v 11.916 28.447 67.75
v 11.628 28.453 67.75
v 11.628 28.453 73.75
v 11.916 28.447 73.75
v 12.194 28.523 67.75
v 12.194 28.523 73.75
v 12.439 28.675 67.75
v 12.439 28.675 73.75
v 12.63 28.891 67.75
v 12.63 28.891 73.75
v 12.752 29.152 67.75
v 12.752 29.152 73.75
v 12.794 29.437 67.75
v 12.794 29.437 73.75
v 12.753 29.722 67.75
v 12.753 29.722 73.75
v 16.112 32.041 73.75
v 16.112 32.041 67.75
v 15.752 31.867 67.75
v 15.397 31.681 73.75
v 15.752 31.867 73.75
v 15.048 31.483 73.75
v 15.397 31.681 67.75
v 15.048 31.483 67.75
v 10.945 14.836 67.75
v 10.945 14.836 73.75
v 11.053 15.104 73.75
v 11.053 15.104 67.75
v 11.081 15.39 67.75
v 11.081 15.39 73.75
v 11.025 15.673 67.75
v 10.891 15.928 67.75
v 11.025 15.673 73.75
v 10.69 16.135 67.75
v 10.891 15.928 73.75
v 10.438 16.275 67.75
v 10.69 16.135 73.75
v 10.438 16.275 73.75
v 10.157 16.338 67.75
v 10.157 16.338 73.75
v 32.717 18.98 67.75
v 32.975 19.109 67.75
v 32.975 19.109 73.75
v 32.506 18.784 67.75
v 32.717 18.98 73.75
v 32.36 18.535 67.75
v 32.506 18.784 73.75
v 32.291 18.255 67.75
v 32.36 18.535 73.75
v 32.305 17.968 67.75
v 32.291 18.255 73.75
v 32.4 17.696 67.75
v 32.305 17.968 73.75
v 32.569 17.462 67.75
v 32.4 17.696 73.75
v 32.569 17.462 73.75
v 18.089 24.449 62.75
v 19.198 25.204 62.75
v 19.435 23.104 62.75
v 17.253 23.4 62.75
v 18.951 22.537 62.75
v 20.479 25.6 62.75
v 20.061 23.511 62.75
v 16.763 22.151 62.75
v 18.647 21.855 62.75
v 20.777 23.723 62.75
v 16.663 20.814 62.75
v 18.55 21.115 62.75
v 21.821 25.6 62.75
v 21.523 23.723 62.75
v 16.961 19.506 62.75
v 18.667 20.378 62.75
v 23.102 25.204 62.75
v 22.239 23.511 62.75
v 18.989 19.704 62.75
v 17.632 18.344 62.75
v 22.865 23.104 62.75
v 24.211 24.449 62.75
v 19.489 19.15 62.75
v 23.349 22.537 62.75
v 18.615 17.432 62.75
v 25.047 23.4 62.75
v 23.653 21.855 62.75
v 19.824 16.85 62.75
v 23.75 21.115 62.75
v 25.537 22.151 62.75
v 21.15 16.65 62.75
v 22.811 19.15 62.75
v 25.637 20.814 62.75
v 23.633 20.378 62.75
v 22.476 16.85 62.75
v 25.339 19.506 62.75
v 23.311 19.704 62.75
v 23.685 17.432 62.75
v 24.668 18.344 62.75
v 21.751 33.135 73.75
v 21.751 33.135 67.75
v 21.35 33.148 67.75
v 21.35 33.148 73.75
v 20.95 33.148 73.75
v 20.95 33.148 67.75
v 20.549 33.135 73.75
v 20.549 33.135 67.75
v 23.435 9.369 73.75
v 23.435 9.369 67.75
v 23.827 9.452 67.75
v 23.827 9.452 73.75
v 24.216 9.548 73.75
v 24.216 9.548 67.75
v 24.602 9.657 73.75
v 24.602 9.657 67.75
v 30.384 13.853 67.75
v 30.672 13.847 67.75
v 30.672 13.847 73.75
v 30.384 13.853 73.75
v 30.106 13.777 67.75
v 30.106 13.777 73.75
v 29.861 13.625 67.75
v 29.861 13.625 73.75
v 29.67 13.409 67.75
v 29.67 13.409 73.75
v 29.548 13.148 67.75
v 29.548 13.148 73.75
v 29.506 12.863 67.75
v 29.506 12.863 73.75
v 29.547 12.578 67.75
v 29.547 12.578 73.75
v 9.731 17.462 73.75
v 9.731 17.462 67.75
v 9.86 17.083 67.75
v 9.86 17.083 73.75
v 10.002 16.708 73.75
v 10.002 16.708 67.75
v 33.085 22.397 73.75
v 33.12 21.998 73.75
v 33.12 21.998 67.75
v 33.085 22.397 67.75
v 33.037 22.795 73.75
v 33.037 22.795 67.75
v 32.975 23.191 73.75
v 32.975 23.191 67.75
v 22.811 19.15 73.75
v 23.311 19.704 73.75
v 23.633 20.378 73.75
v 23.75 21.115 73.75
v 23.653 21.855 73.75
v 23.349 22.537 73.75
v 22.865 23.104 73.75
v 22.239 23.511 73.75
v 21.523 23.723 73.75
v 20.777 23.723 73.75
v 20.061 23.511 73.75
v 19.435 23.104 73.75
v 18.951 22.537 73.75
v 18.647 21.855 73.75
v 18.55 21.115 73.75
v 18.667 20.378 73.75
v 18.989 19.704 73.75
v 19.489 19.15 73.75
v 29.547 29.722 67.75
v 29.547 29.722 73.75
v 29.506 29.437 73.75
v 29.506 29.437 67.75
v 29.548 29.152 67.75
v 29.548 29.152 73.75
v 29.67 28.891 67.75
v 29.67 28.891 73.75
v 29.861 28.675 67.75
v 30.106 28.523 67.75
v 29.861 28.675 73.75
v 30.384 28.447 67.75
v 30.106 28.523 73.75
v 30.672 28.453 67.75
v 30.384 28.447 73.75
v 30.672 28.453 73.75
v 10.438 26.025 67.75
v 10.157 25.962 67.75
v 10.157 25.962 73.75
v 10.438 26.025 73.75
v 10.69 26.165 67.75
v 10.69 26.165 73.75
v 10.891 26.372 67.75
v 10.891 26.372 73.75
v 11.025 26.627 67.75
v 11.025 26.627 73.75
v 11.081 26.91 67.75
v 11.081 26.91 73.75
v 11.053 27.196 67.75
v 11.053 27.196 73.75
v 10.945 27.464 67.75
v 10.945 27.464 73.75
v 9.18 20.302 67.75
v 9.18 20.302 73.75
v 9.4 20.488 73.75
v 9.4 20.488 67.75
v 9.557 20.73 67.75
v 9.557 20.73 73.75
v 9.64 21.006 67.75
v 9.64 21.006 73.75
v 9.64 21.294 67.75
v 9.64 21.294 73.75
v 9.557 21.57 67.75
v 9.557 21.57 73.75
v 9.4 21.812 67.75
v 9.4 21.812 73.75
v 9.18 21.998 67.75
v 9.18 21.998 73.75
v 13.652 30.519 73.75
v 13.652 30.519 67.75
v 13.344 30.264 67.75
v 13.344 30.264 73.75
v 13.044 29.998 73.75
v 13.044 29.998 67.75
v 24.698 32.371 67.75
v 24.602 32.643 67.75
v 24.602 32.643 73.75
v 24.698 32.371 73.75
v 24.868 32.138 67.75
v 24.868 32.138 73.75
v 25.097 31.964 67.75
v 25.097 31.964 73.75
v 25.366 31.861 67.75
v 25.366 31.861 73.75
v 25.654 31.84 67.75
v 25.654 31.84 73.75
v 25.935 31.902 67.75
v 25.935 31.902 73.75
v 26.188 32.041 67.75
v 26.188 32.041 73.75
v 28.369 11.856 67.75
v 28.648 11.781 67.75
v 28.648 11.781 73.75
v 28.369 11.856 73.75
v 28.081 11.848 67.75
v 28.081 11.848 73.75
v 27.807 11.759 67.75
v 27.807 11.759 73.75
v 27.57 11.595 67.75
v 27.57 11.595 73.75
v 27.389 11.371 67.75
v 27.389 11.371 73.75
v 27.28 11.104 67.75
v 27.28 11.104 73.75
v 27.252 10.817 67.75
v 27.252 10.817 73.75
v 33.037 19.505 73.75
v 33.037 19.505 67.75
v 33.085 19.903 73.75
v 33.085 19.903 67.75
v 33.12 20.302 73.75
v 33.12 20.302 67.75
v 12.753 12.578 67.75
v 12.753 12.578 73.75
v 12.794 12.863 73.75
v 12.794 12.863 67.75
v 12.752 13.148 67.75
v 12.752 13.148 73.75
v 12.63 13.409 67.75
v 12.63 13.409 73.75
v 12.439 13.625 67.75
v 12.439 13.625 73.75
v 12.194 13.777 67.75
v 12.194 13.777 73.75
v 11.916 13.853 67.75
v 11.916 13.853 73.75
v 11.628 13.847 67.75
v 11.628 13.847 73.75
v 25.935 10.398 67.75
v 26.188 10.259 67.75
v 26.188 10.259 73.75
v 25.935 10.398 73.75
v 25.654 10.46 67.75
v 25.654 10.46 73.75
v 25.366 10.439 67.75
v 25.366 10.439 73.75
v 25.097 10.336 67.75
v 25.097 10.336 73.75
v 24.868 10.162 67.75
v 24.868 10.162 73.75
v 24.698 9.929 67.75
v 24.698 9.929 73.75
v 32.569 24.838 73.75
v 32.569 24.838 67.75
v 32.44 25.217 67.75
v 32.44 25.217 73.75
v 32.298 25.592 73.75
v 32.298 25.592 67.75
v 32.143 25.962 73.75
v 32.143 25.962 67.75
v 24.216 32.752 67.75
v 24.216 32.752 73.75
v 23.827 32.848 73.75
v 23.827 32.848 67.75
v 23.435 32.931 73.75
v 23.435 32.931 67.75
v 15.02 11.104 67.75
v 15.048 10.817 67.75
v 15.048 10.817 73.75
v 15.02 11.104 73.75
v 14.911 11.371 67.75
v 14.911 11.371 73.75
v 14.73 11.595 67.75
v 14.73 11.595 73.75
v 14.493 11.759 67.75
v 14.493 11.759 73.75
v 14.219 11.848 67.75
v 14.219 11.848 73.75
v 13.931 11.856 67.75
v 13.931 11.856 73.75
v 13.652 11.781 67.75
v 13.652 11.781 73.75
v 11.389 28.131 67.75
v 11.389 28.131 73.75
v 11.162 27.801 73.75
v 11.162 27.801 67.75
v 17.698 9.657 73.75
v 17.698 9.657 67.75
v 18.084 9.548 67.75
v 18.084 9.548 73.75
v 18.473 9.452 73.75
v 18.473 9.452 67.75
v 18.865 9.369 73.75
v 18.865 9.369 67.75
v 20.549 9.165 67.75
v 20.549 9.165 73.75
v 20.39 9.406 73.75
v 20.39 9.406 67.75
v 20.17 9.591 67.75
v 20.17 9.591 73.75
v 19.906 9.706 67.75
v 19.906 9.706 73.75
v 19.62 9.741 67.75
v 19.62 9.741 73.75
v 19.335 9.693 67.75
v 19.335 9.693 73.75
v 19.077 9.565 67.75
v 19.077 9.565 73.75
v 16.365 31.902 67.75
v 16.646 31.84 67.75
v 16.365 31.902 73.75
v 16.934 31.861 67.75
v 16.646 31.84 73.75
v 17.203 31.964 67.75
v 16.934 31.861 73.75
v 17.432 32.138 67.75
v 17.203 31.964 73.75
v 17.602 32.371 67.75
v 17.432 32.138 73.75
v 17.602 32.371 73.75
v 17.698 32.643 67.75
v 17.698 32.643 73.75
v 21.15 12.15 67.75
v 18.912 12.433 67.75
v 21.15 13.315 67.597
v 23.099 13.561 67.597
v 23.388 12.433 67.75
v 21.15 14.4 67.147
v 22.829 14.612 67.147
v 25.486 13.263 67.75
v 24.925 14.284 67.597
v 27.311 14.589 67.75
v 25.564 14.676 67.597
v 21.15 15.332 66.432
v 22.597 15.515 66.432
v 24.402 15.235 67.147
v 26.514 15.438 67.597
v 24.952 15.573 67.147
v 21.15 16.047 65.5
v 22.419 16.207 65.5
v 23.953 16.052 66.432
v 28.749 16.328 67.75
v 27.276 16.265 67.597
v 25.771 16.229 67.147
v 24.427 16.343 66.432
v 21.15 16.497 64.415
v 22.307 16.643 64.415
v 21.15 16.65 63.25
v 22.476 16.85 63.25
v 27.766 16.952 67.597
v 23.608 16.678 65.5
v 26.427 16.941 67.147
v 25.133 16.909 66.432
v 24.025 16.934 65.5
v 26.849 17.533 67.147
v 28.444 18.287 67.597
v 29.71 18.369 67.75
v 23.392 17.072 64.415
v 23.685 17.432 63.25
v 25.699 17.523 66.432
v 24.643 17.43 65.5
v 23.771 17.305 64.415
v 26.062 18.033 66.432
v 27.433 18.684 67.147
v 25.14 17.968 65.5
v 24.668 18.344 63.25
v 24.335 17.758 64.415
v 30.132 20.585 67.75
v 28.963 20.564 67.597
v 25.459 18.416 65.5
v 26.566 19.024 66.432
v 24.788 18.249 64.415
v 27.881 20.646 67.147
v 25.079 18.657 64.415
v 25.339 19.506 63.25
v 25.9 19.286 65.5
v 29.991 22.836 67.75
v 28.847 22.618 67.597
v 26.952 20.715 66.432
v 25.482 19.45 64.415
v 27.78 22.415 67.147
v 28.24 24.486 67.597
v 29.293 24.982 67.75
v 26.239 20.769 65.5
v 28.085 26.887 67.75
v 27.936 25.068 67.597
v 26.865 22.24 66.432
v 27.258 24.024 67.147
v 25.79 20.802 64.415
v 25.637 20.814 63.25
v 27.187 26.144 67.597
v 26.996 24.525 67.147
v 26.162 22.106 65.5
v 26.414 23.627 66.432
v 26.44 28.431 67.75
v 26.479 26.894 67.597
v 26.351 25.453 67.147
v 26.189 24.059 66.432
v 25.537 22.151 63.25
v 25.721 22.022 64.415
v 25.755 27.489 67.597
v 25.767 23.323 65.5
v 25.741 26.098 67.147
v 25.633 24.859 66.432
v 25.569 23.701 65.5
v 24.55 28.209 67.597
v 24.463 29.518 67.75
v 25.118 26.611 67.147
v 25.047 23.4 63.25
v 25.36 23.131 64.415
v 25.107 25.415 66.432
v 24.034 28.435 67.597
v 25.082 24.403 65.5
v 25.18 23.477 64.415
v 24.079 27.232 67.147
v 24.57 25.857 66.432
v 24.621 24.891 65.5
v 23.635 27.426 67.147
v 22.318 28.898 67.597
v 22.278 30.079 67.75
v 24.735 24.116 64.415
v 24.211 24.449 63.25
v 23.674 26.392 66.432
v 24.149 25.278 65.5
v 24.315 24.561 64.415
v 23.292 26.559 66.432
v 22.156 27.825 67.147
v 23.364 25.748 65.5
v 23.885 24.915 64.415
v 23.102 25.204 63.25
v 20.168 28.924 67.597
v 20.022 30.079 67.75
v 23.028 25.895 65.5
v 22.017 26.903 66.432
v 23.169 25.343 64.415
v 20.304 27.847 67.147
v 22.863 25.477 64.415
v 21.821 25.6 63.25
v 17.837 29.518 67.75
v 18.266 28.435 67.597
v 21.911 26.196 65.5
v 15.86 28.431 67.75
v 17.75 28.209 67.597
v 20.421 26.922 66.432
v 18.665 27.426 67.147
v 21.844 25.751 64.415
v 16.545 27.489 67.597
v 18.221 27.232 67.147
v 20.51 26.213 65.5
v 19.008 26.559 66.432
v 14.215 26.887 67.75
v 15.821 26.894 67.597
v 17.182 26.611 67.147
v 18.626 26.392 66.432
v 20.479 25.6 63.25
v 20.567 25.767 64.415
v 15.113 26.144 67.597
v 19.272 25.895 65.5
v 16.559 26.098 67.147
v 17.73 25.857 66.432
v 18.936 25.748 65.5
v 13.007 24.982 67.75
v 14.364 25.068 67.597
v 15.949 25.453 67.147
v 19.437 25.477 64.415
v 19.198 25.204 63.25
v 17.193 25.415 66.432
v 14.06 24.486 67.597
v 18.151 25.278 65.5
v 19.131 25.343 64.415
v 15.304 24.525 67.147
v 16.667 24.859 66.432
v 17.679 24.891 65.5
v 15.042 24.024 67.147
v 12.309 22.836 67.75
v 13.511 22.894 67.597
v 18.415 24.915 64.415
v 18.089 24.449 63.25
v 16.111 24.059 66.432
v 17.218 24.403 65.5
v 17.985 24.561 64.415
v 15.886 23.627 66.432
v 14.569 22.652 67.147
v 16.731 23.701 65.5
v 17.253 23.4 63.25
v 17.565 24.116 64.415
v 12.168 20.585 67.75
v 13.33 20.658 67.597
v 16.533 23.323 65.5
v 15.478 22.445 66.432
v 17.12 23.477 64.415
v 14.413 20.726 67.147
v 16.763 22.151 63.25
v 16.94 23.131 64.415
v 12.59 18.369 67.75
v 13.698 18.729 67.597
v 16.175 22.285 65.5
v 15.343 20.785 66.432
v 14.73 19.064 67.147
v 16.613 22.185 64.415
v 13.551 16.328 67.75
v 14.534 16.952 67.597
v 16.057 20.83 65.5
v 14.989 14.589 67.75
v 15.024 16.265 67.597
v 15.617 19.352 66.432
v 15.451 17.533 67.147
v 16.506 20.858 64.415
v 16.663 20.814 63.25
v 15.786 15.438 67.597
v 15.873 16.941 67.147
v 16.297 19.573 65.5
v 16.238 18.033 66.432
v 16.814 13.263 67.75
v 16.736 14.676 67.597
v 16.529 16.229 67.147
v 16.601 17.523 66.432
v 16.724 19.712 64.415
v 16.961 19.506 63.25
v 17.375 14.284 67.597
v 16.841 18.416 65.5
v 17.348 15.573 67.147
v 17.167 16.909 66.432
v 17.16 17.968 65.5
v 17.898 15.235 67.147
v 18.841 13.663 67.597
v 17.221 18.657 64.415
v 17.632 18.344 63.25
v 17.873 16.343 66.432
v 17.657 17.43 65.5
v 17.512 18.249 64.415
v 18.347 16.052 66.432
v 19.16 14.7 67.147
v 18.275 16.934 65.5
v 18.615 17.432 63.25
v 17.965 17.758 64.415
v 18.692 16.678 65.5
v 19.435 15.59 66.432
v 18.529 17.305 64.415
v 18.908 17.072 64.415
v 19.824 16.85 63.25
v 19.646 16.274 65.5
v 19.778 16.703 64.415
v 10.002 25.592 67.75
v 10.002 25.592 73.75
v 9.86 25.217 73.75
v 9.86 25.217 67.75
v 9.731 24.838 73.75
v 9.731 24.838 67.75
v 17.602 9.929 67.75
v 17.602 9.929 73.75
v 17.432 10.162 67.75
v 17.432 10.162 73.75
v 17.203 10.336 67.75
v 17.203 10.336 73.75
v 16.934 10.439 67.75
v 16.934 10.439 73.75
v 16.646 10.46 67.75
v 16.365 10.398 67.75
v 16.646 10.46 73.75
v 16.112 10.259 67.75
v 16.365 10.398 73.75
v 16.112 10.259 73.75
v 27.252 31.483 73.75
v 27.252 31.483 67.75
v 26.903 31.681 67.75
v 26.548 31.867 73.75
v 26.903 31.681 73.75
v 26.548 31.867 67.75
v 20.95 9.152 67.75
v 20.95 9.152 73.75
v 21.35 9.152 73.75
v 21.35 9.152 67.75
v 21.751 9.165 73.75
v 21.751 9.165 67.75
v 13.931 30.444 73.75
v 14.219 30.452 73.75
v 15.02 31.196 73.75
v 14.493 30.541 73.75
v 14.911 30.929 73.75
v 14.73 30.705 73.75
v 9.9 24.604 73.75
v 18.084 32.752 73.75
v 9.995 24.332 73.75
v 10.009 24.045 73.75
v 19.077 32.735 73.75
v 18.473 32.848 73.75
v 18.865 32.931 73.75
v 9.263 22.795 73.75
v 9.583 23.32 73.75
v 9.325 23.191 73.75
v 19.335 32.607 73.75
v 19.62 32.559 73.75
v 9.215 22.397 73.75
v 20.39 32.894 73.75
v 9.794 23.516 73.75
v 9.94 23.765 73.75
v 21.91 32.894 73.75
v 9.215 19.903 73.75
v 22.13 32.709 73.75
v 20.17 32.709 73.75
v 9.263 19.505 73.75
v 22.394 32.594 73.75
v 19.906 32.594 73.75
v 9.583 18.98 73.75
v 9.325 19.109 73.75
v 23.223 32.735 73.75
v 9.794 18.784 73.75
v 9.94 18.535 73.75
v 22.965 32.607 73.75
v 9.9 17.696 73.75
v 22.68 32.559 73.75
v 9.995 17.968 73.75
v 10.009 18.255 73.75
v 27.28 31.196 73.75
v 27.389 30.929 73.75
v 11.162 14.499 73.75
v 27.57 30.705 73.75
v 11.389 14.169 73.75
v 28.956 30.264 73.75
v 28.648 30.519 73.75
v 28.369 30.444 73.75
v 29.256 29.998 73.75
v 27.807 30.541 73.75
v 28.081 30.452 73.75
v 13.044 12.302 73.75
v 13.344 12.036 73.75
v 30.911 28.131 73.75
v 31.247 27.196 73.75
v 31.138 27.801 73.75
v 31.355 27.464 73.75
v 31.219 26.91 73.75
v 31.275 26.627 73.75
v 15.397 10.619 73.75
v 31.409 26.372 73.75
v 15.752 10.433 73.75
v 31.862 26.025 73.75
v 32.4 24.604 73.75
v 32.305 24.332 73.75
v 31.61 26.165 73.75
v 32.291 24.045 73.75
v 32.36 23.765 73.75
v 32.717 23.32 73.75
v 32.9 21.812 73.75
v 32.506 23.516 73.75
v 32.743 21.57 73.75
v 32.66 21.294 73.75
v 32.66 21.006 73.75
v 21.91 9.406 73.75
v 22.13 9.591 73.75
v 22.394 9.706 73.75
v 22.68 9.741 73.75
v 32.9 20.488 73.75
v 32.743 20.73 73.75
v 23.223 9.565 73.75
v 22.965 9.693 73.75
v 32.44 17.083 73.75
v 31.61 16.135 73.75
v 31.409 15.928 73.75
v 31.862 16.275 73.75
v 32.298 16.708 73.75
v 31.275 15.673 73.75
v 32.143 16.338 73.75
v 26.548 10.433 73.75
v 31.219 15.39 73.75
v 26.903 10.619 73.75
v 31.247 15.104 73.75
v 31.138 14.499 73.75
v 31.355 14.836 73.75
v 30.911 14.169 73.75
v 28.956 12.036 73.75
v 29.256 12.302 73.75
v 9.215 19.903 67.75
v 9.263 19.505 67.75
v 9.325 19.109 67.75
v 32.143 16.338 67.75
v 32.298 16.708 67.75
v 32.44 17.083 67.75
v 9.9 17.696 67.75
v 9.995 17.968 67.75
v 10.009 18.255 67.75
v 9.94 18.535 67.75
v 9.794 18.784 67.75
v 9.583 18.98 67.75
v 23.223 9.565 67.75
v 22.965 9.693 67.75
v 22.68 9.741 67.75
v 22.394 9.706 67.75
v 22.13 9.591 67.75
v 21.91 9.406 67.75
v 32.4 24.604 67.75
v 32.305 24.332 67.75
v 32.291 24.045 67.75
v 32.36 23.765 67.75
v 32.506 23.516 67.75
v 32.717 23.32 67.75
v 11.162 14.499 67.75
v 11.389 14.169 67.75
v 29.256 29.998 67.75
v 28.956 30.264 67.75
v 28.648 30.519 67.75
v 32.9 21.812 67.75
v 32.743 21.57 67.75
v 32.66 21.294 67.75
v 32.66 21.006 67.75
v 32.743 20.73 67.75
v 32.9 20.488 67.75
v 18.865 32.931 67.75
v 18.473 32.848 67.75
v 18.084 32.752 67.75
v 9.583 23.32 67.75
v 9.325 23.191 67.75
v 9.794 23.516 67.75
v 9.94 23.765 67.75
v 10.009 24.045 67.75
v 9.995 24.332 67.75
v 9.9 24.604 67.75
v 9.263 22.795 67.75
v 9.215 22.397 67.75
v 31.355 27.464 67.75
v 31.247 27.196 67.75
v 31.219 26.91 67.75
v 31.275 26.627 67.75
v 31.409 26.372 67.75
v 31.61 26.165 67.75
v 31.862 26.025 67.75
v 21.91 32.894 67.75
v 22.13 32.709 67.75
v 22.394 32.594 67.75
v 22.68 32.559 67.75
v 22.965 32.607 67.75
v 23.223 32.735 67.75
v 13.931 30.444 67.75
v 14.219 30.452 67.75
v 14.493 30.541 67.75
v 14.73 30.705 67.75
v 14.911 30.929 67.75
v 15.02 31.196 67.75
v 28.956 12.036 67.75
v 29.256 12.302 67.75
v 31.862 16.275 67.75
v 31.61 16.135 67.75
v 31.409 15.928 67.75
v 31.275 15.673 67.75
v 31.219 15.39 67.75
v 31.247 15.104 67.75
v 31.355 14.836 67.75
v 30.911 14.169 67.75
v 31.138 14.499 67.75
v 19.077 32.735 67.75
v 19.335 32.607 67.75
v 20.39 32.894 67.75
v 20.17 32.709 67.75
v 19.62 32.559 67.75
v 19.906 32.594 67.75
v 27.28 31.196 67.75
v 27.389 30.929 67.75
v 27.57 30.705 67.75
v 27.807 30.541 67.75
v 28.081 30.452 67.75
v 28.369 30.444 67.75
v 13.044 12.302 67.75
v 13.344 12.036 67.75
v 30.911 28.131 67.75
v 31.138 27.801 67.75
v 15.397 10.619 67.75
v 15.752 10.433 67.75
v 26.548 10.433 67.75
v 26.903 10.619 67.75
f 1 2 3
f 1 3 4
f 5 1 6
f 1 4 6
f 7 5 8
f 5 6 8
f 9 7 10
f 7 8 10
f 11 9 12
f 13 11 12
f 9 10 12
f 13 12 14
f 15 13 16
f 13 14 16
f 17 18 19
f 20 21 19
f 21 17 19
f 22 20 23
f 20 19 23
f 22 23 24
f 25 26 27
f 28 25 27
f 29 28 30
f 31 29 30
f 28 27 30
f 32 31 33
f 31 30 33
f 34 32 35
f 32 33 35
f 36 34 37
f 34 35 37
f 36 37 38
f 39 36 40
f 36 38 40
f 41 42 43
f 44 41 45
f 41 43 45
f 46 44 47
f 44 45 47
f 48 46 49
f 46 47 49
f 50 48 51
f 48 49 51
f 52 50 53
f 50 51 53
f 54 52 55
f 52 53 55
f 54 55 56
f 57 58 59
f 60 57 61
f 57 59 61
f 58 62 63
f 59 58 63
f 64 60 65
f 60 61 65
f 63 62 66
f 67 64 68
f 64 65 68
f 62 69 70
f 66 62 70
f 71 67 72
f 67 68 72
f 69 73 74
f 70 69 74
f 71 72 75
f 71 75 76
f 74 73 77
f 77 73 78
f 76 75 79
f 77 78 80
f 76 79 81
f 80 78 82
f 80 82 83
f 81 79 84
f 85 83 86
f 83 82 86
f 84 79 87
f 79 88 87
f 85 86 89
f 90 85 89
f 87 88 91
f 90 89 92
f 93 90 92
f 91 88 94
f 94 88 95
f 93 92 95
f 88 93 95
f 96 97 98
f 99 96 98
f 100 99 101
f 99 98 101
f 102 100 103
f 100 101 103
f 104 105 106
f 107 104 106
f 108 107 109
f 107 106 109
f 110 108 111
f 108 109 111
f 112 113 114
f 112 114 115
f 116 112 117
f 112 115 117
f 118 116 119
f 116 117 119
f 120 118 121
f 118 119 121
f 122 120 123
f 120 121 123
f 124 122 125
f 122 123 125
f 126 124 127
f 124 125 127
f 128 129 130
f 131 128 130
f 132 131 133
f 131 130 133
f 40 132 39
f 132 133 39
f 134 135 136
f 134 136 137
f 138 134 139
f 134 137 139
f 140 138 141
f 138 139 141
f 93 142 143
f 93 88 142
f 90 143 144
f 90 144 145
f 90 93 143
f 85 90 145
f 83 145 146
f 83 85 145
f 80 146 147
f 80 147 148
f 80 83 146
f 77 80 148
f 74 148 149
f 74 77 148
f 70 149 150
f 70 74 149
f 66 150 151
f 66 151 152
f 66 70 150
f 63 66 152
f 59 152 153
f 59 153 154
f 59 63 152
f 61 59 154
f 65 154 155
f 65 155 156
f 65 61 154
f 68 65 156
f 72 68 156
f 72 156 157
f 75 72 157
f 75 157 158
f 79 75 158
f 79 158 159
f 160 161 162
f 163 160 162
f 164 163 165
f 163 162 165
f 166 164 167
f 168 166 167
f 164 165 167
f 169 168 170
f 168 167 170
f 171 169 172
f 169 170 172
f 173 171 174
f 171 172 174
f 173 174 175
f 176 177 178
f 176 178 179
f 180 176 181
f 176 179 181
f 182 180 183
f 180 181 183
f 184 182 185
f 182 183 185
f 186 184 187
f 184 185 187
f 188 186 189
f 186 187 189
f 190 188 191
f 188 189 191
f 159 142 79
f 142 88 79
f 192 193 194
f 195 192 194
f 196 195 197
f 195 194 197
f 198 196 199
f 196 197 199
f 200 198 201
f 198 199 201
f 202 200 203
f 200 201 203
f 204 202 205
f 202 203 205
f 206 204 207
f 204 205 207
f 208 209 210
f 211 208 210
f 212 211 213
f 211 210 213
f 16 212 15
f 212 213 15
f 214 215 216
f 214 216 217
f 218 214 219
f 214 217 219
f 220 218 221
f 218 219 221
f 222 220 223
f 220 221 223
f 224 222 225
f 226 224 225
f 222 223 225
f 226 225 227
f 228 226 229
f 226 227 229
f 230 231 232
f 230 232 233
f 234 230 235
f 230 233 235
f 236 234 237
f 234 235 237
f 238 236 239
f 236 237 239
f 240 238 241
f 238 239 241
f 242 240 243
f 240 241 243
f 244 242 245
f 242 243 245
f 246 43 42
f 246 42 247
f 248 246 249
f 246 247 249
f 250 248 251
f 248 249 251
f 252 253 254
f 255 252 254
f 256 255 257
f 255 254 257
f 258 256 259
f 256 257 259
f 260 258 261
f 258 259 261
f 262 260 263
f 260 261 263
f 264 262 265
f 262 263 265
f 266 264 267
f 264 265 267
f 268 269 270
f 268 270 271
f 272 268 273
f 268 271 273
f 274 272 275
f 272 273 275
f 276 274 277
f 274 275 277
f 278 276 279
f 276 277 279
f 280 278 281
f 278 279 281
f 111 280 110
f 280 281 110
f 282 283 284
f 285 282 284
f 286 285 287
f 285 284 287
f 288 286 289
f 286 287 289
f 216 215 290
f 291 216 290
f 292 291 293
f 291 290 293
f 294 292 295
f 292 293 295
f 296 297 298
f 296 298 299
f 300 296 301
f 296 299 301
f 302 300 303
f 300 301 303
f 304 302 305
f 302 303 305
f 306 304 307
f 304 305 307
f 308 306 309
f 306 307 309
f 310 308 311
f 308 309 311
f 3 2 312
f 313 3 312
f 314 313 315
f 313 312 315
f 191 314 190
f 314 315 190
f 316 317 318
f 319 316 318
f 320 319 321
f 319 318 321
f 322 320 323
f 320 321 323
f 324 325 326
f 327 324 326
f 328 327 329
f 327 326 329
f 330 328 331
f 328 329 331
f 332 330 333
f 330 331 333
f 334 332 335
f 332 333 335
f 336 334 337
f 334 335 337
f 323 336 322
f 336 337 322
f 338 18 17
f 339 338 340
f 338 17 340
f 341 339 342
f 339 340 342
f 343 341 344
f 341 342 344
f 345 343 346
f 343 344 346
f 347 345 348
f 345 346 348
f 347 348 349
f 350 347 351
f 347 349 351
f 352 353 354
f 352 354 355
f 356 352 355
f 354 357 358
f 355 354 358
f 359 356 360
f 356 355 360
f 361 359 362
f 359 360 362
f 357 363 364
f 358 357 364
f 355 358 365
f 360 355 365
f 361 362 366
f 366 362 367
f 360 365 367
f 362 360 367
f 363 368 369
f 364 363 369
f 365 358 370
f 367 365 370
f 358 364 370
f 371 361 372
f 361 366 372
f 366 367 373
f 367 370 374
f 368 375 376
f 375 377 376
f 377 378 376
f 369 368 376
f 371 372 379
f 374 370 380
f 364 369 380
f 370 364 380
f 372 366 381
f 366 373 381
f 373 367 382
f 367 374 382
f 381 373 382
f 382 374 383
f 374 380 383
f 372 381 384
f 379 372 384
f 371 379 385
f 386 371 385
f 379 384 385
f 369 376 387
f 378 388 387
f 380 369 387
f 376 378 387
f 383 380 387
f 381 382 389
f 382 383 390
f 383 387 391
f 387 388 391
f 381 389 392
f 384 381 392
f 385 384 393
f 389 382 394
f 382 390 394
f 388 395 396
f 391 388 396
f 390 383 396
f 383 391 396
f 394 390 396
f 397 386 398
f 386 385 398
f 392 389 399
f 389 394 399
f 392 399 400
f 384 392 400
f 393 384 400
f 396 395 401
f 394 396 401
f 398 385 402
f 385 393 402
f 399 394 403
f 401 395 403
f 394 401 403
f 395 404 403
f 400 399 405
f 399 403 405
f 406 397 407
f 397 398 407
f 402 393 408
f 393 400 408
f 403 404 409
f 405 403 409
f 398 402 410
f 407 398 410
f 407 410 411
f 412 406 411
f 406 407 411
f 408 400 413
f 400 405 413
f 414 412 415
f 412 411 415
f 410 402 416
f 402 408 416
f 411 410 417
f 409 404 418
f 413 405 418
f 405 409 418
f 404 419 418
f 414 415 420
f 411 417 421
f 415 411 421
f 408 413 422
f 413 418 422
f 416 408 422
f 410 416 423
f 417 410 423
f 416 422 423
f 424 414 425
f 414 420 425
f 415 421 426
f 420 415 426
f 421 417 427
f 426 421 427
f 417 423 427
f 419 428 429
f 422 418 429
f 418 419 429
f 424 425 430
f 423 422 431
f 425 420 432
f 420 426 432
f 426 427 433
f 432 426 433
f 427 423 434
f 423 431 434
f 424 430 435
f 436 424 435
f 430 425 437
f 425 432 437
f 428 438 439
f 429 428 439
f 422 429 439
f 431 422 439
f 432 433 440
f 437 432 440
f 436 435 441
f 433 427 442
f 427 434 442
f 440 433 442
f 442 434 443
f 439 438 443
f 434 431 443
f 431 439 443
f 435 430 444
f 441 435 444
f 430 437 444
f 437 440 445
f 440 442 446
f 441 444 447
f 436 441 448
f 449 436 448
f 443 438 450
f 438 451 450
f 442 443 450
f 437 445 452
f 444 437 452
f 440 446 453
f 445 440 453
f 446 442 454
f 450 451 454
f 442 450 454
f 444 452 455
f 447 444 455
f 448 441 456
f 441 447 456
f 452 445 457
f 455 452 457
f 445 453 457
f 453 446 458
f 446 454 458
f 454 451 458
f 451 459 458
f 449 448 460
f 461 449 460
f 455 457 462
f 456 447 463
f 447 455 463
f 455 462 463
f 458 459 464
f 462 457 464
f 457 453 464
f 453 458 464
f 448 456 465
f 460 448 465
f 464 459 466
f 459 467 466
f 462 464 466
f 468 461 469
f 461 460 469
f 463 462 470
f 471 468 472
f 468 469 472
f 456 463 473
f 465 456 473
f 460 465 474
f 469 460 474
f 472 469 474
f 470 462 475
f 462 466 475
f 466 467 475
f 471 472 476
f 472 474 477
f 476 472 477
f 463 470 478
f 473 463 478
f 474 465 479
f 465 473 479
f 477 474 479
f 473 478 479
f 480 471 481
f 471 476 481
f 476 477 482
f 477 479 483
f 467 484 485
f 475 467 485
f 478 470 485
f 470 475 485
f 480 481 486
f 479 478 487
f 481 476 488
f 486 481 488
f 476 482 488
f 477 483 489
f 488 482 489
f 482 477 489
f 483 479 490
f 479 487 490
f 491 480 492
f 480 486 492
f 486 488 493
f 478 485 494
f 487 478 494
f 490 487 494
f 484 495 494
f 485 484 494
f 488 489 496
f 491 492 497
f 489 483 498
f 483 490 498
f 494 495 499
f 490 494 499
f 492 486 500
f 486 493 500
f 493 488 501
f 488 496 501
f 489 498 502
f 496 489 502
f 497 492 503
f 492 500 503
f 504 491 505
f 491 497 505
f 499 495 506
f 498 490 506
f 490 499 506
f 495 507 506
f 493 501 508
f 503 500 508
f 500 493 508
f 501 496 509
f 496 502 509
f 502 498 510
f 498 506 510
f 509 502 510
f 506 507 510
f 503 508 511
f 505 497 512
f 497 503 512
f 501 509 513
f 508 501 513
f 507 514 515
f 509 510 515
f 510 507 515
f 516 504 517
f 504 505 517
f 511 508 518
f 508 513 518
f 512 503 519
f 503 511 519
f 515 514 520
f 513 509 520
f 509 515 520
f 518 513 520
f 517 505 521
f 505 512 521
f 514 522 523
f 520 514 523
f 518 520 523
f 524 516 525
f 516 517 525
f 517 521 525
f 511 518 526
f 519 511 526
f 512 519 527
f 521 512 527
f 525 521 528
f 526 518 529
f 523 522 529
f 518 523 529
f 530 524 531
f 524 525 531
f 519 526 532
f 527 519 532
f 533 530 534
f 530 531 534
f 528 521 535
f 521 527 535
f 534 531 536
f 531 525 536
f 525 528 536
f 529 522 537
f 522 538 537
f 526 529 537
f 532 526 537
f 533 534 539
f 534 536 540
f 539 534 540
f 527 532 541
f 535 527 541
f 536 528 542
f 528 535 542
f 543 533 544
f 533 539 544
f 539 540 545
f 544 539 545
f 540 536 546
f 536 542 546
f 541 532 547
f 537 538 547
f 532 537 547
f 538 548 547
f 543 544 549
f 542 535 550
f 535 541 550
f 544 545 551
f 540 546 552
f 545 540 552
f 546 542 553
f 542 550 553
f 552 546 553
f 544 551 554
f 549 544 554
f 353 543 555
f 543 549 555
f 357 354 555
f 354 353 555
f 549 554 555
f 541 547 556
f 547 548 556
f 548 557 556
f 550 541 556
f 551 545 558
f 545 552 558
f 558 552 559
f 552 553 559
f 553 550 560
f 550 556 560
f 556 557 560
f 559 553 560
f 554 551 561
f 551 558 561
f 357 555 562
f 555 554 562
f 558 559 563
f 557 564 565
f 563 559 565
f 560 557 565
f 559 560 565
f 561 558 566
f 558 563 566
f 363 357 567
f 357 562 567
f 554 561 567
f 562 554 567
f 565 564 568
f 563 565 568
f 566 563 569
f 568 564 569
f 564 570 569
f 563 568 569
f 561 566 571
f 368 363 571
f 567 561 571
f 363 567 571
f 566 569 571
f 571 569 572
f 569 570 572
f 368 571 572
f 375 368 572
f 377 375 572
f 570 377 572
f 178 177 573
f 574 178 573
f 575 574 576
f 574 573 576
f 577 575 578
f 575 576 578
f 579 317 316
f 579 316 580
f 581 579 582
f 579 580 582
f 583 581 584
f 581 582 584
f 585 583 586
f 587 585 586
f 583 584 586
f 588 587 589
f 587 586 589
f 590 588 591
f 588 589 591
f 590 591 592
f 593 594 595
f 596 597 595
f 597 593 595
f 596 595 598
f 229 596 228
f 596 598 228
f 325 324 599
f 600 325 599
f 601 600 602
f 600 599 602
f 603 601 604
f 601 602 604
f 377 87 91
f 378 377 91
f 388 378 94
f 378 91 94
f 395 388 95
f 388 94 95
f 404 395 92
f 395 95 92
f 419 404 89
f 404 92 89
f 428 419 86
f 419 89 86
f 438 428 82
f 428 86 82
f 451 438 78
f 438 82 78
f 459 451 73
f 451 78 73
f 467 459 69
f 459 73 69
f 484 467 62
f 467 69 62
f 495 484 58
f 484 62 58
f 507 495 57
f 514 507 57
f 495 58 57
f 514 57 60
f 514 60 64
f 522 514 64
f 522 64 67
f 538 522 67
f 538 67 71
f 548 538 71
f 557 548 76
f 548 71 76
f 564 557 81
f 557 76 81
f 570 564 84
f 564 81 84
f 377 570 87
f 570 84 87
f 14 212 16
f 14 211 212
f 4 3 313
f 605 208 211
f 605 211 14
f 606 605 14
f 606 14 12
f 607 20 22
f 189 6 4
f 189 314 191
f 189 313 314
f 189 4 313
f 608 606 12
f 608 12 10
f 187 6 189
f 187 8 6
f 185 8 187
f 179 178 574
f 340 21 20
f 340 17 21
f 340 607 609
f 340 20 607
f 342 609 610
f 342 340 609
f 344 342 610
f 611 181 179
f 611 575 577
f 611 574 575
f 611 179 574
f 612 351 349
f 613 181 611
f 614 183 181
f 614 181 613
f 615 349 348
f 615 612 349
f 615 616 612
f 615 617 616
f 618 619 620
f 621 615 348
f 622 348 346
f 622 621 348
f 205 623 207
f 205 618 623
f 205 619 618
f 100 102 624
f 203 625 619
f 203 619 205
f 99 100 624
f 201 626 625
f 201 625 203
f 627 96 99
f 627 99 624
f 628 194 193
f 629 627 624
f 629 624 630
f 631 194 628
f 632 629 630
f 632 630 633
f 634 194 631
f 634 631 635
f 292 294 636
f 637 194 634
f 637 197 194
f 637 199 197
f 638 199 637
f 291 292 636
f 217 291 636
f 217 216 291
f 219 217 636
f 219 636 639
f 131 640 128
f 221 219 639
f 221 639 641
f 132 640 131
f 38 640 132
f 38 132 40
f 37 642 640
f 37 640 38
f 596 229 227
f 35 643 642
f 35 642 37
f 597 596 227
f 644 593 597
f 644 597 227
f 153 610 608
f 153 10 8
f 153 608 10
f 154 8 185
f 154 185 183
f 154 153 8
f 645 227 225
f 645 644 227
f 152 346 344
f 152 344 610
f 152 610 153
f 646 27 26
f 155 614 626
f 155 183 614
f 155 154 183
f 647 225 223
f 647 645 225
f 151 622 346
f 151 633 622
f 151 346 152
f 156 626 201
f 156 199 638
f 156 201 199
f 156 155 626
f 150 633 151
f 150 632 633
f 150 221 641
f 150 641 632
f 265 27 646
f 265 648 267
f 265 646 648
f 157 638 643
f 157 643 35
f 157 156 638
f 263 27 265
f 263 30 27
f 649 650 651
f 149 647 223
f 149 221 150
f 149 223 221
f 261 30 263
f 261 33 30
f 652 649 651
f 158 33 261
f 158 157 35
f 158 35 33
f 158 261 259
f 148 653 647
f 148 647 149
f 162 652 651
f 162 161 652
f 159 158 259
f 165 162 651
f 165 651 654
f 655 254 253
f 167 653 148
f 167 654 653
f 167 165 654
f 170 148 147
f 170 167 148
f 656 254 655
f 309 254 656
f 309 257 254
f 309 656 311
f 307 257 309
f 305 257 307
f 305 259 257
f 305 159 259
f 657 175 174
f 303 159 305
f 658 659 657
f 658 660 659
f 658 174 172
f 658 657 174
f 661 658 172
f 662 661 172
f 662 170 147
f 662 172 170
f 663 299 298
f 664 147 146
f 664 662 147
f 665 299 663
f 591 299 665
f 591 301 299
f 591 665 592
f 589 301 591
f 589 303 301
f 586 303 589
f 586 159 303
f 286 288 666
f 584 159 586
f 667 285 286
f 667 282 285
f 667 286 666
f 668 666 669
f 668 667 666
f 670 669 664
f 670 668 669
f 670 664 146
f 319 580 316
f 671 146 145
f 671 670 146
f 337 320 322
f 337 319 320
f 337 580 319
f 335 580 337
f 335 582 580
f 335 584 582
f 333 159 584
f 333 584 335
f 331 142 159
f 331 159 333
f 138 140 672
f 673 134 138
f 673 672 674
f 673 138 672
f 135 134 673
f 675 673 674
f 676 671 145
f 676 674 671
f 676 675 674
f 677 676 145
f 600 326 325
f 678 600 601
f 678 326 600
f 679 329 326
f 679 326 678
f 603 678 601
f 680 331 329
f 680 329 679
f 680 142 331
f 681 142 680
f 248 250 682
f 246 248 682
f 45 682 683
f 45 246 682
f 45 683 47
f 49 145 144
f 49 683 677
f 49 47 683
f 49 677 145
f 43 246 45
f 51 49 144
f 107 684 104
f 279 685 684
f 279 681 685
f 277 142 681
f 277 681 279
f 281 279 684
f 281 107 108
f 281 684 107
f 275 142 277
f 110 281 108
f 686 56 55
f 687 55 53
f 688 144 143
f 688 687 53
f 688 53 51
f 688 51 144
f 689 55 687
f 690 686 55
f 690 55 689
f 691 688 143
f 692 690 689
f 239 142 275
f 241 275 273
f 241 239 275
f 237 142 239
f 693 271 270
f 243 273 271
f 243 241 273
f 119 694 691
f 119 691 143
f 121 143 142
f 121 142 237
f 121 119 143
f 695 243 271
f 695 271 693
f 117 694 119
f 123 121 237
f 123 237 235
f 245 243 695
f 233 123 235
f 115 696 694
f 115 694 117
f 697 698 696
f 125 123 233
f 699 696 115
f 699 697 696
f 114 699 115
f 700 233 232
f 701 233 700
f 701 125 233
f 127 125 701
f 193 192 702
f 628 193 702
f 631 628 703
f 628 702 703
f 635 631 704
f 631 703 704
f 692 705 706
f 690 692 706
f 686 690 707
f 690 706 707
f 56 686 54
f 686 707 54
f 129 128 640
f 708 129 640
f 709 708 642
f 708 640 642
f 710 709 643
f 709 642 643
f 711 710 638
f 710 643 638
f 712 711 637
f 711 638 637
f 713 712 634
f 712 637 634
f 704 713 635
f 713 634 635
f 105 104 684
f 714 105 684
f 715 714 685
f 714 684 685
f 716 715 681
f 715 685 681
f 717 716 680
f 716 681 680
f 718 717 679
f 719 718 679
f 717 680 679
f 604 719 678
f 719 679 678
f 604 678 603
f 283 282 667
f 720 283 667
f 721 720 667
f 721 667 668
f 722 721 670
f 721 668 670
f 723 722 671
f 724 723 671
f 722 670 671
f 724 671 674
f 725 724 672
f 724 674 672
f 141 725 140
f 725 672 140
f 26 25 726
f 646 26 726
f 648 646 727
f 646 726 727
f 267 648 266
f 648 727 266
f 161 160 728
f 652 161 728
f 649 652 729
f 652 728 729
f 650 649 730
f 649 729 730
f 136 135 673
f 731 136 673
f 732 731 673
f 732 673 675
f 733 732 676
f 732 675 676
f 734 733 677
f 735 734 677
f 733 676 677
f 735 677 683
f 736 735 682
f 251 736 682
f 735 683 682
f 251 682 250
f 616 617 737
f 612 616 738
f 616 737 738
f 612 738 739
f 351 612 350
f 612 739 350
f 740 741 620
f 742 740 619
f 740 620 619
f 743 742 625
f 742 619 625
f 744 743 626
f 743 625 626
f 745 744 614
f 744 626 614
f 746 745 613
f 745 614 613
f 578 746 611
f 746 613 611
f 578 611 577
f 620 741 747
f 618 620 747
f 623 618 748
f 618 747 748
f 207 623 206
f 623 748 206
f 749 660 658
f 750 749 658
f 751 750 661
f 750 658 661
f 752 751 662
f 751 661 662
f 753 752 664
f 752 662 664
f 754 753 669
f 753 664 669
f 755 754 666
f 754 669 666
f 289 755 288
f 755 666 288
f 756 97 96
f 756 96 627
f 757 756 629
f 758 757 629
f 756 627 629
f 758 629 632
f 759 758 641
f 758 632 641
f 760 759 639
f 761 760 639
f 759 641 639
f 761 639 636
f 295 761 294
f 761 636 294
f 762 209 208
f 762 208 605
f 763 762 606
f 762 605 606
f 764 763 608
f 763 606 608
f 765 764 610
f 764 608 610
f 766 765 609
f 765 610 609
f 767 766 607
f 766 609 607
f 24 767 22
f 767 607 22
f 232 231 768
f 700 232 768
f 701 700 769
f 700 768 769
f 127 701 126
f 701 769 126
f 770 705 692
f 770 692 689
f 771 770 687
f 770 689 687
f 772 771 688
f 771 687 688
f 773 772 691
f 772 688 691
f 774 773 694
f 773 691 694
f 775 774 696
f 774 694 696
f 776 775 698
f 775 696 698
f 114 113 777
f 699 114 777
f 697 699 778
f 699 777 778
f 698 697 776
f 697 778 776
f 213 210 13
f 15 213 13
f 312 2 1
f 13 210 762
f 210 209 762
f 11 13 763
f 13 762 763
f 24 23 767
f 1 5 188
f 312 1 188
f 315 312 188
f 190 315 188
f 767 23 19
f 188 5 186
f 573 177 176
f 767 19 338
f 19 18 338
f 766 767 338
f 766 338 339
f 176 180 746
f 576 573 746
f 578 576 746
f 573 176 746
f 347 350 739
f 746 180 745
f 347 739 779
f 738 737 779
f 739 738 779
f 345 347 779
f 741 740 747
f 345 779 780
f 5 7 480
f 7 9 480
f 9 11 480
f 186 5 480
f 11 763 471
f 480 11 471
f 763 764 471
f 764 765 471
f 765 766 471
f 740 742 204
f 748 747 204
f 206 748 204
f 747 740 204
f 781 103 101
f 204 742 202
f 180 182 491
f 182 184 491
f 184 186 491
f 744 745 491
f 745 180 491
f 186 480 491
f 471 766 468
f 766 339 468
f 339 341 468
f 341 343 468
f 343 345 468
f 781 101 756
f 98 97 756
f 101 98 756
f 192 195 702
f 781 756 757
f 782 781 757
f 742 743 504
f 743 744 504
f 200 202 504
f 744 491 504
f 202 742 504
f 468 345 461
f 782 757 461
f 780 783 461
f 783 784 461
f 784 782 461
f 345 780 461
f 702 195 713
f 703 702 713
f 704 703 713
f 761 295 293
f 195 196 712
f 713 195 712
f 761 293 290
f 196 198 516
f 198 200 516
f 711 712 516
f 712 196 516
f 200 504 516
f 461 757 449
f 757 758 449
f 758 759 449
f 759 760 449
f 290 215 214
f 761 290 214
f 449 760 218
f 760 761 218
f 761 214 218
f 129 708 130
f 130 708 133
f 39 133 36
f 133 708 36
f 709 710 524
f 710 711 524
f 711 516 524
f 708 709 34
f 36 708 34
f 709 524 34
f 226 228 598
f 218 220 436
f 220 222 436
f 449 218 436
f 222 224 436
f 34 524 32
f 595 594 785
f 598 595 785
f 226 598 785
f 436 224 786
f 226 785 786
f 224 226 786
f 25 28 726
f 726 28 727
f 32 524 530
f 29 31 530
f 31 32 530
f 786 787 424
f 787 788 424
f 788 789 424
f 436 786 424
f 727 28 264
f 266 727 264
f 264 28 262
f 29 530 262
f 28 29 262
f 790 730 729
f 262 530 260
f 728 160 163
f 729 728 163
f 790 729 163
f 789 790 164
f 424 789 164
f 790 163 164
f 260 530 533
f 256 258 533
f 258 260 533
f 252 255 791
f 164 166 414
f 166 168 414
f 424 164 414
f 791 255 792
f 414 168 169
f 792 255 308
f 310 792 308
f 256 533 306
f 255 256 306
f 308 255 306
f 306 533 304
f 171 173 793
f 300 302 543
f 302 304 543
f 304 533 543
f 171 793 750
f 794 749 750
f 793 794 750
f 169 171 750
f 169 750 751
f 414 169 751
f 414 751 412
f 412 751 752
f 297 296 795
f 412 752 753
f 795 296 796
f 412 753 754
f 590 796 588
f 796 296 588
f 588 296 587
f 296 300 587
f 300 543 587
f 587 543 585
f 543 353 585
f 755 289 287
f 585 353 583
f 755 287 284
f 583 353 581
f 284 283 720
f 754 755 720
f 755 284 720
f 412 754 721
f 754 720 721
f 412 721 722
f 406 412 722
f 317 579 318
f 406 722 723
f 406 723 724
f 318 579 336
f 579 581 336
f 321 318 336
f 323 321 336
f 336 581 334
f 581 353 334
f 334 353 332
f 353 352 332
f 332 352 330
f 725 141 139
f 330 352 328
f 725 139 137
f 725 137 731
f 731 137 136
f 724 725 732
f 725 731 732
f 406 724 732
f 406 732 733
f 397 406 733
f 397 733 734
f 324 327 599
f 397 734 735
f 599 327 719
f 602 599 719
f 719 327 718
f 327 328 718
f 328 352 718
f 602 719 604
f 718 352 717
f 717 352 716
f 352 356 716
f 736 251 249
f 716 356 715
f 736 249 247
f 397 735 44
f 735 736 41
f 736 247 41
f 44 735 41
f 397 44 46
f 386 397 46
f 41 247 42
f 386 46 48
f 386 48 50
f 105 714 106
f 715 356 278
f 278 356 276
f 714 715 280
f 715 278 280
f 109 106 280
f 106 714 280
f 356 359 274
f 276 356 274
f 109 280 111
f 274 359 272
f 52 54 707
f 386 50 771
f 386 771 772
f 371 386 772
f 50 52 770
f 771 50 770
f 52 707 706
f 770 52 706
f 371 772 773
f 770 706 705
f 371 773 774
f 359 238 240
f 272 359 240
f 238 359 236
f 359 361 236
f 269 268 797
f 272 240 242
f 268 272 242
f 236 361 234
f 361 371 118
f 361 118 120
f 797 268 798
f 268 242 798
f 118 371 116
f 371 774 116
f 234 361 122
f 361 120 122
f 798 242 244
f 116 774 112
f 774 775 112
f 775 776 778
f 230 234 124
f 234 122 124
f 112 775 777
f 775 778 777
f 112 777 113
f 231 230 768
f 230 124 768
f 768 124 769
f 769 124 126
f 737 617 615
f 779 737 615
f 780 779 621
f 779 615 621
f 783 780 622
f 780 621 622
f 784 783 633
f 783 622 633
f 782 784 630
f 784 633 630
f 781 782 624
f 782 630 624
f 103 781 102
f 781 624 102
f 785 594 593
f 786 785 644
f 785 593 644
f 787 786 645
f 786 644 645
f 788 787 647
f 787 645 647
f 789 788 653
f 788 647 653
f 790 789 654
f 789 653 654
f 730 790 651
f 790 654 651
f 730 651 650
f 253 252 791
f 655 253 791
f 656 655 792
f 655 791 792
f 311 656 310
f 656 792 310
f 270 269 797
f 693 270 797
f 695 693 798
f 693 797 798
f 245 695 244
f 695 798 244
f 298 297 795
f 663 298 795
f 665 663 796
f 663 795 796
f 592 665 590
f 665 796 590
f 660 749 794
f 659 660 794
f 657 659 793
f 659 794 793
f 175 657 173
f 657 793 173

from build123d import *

# Parameters (mm, degrees)
SKETCH019_R        = 4.5
PAD010_DEPTH       = 5
SKETCH020_R        = 12
PAD011_DEPTH       = 6
SKETCH021_R        = 1
POCKET006_DEPTH    = 6
POLARPATTERN_COUNT = 26
FILLET_R           = 4.5


with BuildPart() as part:
    # Sketch019 → Pad010 (new body)
    with BuildSketch(Plane(origin=(21.15, 21.15, 62.75), x_dir=(0, -1, 0), z_dir=(0, 0, 1))):
        Circle(SKETCH019_R)
        with BuildLine():
            ThreePointArc((2, 1.661325), (-2.6, 0), (2, -1.661325))
            Line((2, 1.661325), (2, -1.661325))
        make_face(mode=Mode.SUBTRACT)
    extrude(amount=PAD010_DEPTH)

    # Sketch020 → Pad011 (new body)
    with BuildSketch(Plane(origin=(21.15, 21.15, 67.75), x_dir=(0, -1, 0), z_dir=(0, 0, 1))):
        Circle(SKETCH020_R)
        with BuildLine():
            ThreePointArc((2, 1.661325), (-2.6, 0), (2, -1.661325))
            Line((2, 1.661325), (2, -1.661325))
        make_face(mode=Mode.SUBTRACT)
    extrude(amount=PAD011_DEPTH)

    # Sketch021 → Pocket006 (cut)
    with BuildSketch(Plane(origin=(21.15, 21.15, 73.75), x_dir=(0, -1, 0), z_dir=(0, 0, 1))):
        with Locations((0, 12.5)):
            Circle(SKETCH021_R)
    pocket006 = extrude(amount=-POCKET006_DEPTH, mode=Mode.SUBTRACT)

    # PolarPattern: Pocket006 ×26 about axis
    polarpattern_axis = Axis((21.15, 21.15, 73.75), (0, 0, 1))
    for i in range(1, POLARPATTERN_COUNT):
        add(pocket006.rotate(polarpattern_axis, i * 360 / POLARPATTERN_COUNT), mode=Mode.SUBTRACT)

    # Fillet
    fillet_edges = [part.edges().sort_by_distance(p)[0] for p in [
        (21.15, 25.65, 67.75),
    ]]
    fillet(fillet_edges, radius=FILLET_R)


solid = part.part
